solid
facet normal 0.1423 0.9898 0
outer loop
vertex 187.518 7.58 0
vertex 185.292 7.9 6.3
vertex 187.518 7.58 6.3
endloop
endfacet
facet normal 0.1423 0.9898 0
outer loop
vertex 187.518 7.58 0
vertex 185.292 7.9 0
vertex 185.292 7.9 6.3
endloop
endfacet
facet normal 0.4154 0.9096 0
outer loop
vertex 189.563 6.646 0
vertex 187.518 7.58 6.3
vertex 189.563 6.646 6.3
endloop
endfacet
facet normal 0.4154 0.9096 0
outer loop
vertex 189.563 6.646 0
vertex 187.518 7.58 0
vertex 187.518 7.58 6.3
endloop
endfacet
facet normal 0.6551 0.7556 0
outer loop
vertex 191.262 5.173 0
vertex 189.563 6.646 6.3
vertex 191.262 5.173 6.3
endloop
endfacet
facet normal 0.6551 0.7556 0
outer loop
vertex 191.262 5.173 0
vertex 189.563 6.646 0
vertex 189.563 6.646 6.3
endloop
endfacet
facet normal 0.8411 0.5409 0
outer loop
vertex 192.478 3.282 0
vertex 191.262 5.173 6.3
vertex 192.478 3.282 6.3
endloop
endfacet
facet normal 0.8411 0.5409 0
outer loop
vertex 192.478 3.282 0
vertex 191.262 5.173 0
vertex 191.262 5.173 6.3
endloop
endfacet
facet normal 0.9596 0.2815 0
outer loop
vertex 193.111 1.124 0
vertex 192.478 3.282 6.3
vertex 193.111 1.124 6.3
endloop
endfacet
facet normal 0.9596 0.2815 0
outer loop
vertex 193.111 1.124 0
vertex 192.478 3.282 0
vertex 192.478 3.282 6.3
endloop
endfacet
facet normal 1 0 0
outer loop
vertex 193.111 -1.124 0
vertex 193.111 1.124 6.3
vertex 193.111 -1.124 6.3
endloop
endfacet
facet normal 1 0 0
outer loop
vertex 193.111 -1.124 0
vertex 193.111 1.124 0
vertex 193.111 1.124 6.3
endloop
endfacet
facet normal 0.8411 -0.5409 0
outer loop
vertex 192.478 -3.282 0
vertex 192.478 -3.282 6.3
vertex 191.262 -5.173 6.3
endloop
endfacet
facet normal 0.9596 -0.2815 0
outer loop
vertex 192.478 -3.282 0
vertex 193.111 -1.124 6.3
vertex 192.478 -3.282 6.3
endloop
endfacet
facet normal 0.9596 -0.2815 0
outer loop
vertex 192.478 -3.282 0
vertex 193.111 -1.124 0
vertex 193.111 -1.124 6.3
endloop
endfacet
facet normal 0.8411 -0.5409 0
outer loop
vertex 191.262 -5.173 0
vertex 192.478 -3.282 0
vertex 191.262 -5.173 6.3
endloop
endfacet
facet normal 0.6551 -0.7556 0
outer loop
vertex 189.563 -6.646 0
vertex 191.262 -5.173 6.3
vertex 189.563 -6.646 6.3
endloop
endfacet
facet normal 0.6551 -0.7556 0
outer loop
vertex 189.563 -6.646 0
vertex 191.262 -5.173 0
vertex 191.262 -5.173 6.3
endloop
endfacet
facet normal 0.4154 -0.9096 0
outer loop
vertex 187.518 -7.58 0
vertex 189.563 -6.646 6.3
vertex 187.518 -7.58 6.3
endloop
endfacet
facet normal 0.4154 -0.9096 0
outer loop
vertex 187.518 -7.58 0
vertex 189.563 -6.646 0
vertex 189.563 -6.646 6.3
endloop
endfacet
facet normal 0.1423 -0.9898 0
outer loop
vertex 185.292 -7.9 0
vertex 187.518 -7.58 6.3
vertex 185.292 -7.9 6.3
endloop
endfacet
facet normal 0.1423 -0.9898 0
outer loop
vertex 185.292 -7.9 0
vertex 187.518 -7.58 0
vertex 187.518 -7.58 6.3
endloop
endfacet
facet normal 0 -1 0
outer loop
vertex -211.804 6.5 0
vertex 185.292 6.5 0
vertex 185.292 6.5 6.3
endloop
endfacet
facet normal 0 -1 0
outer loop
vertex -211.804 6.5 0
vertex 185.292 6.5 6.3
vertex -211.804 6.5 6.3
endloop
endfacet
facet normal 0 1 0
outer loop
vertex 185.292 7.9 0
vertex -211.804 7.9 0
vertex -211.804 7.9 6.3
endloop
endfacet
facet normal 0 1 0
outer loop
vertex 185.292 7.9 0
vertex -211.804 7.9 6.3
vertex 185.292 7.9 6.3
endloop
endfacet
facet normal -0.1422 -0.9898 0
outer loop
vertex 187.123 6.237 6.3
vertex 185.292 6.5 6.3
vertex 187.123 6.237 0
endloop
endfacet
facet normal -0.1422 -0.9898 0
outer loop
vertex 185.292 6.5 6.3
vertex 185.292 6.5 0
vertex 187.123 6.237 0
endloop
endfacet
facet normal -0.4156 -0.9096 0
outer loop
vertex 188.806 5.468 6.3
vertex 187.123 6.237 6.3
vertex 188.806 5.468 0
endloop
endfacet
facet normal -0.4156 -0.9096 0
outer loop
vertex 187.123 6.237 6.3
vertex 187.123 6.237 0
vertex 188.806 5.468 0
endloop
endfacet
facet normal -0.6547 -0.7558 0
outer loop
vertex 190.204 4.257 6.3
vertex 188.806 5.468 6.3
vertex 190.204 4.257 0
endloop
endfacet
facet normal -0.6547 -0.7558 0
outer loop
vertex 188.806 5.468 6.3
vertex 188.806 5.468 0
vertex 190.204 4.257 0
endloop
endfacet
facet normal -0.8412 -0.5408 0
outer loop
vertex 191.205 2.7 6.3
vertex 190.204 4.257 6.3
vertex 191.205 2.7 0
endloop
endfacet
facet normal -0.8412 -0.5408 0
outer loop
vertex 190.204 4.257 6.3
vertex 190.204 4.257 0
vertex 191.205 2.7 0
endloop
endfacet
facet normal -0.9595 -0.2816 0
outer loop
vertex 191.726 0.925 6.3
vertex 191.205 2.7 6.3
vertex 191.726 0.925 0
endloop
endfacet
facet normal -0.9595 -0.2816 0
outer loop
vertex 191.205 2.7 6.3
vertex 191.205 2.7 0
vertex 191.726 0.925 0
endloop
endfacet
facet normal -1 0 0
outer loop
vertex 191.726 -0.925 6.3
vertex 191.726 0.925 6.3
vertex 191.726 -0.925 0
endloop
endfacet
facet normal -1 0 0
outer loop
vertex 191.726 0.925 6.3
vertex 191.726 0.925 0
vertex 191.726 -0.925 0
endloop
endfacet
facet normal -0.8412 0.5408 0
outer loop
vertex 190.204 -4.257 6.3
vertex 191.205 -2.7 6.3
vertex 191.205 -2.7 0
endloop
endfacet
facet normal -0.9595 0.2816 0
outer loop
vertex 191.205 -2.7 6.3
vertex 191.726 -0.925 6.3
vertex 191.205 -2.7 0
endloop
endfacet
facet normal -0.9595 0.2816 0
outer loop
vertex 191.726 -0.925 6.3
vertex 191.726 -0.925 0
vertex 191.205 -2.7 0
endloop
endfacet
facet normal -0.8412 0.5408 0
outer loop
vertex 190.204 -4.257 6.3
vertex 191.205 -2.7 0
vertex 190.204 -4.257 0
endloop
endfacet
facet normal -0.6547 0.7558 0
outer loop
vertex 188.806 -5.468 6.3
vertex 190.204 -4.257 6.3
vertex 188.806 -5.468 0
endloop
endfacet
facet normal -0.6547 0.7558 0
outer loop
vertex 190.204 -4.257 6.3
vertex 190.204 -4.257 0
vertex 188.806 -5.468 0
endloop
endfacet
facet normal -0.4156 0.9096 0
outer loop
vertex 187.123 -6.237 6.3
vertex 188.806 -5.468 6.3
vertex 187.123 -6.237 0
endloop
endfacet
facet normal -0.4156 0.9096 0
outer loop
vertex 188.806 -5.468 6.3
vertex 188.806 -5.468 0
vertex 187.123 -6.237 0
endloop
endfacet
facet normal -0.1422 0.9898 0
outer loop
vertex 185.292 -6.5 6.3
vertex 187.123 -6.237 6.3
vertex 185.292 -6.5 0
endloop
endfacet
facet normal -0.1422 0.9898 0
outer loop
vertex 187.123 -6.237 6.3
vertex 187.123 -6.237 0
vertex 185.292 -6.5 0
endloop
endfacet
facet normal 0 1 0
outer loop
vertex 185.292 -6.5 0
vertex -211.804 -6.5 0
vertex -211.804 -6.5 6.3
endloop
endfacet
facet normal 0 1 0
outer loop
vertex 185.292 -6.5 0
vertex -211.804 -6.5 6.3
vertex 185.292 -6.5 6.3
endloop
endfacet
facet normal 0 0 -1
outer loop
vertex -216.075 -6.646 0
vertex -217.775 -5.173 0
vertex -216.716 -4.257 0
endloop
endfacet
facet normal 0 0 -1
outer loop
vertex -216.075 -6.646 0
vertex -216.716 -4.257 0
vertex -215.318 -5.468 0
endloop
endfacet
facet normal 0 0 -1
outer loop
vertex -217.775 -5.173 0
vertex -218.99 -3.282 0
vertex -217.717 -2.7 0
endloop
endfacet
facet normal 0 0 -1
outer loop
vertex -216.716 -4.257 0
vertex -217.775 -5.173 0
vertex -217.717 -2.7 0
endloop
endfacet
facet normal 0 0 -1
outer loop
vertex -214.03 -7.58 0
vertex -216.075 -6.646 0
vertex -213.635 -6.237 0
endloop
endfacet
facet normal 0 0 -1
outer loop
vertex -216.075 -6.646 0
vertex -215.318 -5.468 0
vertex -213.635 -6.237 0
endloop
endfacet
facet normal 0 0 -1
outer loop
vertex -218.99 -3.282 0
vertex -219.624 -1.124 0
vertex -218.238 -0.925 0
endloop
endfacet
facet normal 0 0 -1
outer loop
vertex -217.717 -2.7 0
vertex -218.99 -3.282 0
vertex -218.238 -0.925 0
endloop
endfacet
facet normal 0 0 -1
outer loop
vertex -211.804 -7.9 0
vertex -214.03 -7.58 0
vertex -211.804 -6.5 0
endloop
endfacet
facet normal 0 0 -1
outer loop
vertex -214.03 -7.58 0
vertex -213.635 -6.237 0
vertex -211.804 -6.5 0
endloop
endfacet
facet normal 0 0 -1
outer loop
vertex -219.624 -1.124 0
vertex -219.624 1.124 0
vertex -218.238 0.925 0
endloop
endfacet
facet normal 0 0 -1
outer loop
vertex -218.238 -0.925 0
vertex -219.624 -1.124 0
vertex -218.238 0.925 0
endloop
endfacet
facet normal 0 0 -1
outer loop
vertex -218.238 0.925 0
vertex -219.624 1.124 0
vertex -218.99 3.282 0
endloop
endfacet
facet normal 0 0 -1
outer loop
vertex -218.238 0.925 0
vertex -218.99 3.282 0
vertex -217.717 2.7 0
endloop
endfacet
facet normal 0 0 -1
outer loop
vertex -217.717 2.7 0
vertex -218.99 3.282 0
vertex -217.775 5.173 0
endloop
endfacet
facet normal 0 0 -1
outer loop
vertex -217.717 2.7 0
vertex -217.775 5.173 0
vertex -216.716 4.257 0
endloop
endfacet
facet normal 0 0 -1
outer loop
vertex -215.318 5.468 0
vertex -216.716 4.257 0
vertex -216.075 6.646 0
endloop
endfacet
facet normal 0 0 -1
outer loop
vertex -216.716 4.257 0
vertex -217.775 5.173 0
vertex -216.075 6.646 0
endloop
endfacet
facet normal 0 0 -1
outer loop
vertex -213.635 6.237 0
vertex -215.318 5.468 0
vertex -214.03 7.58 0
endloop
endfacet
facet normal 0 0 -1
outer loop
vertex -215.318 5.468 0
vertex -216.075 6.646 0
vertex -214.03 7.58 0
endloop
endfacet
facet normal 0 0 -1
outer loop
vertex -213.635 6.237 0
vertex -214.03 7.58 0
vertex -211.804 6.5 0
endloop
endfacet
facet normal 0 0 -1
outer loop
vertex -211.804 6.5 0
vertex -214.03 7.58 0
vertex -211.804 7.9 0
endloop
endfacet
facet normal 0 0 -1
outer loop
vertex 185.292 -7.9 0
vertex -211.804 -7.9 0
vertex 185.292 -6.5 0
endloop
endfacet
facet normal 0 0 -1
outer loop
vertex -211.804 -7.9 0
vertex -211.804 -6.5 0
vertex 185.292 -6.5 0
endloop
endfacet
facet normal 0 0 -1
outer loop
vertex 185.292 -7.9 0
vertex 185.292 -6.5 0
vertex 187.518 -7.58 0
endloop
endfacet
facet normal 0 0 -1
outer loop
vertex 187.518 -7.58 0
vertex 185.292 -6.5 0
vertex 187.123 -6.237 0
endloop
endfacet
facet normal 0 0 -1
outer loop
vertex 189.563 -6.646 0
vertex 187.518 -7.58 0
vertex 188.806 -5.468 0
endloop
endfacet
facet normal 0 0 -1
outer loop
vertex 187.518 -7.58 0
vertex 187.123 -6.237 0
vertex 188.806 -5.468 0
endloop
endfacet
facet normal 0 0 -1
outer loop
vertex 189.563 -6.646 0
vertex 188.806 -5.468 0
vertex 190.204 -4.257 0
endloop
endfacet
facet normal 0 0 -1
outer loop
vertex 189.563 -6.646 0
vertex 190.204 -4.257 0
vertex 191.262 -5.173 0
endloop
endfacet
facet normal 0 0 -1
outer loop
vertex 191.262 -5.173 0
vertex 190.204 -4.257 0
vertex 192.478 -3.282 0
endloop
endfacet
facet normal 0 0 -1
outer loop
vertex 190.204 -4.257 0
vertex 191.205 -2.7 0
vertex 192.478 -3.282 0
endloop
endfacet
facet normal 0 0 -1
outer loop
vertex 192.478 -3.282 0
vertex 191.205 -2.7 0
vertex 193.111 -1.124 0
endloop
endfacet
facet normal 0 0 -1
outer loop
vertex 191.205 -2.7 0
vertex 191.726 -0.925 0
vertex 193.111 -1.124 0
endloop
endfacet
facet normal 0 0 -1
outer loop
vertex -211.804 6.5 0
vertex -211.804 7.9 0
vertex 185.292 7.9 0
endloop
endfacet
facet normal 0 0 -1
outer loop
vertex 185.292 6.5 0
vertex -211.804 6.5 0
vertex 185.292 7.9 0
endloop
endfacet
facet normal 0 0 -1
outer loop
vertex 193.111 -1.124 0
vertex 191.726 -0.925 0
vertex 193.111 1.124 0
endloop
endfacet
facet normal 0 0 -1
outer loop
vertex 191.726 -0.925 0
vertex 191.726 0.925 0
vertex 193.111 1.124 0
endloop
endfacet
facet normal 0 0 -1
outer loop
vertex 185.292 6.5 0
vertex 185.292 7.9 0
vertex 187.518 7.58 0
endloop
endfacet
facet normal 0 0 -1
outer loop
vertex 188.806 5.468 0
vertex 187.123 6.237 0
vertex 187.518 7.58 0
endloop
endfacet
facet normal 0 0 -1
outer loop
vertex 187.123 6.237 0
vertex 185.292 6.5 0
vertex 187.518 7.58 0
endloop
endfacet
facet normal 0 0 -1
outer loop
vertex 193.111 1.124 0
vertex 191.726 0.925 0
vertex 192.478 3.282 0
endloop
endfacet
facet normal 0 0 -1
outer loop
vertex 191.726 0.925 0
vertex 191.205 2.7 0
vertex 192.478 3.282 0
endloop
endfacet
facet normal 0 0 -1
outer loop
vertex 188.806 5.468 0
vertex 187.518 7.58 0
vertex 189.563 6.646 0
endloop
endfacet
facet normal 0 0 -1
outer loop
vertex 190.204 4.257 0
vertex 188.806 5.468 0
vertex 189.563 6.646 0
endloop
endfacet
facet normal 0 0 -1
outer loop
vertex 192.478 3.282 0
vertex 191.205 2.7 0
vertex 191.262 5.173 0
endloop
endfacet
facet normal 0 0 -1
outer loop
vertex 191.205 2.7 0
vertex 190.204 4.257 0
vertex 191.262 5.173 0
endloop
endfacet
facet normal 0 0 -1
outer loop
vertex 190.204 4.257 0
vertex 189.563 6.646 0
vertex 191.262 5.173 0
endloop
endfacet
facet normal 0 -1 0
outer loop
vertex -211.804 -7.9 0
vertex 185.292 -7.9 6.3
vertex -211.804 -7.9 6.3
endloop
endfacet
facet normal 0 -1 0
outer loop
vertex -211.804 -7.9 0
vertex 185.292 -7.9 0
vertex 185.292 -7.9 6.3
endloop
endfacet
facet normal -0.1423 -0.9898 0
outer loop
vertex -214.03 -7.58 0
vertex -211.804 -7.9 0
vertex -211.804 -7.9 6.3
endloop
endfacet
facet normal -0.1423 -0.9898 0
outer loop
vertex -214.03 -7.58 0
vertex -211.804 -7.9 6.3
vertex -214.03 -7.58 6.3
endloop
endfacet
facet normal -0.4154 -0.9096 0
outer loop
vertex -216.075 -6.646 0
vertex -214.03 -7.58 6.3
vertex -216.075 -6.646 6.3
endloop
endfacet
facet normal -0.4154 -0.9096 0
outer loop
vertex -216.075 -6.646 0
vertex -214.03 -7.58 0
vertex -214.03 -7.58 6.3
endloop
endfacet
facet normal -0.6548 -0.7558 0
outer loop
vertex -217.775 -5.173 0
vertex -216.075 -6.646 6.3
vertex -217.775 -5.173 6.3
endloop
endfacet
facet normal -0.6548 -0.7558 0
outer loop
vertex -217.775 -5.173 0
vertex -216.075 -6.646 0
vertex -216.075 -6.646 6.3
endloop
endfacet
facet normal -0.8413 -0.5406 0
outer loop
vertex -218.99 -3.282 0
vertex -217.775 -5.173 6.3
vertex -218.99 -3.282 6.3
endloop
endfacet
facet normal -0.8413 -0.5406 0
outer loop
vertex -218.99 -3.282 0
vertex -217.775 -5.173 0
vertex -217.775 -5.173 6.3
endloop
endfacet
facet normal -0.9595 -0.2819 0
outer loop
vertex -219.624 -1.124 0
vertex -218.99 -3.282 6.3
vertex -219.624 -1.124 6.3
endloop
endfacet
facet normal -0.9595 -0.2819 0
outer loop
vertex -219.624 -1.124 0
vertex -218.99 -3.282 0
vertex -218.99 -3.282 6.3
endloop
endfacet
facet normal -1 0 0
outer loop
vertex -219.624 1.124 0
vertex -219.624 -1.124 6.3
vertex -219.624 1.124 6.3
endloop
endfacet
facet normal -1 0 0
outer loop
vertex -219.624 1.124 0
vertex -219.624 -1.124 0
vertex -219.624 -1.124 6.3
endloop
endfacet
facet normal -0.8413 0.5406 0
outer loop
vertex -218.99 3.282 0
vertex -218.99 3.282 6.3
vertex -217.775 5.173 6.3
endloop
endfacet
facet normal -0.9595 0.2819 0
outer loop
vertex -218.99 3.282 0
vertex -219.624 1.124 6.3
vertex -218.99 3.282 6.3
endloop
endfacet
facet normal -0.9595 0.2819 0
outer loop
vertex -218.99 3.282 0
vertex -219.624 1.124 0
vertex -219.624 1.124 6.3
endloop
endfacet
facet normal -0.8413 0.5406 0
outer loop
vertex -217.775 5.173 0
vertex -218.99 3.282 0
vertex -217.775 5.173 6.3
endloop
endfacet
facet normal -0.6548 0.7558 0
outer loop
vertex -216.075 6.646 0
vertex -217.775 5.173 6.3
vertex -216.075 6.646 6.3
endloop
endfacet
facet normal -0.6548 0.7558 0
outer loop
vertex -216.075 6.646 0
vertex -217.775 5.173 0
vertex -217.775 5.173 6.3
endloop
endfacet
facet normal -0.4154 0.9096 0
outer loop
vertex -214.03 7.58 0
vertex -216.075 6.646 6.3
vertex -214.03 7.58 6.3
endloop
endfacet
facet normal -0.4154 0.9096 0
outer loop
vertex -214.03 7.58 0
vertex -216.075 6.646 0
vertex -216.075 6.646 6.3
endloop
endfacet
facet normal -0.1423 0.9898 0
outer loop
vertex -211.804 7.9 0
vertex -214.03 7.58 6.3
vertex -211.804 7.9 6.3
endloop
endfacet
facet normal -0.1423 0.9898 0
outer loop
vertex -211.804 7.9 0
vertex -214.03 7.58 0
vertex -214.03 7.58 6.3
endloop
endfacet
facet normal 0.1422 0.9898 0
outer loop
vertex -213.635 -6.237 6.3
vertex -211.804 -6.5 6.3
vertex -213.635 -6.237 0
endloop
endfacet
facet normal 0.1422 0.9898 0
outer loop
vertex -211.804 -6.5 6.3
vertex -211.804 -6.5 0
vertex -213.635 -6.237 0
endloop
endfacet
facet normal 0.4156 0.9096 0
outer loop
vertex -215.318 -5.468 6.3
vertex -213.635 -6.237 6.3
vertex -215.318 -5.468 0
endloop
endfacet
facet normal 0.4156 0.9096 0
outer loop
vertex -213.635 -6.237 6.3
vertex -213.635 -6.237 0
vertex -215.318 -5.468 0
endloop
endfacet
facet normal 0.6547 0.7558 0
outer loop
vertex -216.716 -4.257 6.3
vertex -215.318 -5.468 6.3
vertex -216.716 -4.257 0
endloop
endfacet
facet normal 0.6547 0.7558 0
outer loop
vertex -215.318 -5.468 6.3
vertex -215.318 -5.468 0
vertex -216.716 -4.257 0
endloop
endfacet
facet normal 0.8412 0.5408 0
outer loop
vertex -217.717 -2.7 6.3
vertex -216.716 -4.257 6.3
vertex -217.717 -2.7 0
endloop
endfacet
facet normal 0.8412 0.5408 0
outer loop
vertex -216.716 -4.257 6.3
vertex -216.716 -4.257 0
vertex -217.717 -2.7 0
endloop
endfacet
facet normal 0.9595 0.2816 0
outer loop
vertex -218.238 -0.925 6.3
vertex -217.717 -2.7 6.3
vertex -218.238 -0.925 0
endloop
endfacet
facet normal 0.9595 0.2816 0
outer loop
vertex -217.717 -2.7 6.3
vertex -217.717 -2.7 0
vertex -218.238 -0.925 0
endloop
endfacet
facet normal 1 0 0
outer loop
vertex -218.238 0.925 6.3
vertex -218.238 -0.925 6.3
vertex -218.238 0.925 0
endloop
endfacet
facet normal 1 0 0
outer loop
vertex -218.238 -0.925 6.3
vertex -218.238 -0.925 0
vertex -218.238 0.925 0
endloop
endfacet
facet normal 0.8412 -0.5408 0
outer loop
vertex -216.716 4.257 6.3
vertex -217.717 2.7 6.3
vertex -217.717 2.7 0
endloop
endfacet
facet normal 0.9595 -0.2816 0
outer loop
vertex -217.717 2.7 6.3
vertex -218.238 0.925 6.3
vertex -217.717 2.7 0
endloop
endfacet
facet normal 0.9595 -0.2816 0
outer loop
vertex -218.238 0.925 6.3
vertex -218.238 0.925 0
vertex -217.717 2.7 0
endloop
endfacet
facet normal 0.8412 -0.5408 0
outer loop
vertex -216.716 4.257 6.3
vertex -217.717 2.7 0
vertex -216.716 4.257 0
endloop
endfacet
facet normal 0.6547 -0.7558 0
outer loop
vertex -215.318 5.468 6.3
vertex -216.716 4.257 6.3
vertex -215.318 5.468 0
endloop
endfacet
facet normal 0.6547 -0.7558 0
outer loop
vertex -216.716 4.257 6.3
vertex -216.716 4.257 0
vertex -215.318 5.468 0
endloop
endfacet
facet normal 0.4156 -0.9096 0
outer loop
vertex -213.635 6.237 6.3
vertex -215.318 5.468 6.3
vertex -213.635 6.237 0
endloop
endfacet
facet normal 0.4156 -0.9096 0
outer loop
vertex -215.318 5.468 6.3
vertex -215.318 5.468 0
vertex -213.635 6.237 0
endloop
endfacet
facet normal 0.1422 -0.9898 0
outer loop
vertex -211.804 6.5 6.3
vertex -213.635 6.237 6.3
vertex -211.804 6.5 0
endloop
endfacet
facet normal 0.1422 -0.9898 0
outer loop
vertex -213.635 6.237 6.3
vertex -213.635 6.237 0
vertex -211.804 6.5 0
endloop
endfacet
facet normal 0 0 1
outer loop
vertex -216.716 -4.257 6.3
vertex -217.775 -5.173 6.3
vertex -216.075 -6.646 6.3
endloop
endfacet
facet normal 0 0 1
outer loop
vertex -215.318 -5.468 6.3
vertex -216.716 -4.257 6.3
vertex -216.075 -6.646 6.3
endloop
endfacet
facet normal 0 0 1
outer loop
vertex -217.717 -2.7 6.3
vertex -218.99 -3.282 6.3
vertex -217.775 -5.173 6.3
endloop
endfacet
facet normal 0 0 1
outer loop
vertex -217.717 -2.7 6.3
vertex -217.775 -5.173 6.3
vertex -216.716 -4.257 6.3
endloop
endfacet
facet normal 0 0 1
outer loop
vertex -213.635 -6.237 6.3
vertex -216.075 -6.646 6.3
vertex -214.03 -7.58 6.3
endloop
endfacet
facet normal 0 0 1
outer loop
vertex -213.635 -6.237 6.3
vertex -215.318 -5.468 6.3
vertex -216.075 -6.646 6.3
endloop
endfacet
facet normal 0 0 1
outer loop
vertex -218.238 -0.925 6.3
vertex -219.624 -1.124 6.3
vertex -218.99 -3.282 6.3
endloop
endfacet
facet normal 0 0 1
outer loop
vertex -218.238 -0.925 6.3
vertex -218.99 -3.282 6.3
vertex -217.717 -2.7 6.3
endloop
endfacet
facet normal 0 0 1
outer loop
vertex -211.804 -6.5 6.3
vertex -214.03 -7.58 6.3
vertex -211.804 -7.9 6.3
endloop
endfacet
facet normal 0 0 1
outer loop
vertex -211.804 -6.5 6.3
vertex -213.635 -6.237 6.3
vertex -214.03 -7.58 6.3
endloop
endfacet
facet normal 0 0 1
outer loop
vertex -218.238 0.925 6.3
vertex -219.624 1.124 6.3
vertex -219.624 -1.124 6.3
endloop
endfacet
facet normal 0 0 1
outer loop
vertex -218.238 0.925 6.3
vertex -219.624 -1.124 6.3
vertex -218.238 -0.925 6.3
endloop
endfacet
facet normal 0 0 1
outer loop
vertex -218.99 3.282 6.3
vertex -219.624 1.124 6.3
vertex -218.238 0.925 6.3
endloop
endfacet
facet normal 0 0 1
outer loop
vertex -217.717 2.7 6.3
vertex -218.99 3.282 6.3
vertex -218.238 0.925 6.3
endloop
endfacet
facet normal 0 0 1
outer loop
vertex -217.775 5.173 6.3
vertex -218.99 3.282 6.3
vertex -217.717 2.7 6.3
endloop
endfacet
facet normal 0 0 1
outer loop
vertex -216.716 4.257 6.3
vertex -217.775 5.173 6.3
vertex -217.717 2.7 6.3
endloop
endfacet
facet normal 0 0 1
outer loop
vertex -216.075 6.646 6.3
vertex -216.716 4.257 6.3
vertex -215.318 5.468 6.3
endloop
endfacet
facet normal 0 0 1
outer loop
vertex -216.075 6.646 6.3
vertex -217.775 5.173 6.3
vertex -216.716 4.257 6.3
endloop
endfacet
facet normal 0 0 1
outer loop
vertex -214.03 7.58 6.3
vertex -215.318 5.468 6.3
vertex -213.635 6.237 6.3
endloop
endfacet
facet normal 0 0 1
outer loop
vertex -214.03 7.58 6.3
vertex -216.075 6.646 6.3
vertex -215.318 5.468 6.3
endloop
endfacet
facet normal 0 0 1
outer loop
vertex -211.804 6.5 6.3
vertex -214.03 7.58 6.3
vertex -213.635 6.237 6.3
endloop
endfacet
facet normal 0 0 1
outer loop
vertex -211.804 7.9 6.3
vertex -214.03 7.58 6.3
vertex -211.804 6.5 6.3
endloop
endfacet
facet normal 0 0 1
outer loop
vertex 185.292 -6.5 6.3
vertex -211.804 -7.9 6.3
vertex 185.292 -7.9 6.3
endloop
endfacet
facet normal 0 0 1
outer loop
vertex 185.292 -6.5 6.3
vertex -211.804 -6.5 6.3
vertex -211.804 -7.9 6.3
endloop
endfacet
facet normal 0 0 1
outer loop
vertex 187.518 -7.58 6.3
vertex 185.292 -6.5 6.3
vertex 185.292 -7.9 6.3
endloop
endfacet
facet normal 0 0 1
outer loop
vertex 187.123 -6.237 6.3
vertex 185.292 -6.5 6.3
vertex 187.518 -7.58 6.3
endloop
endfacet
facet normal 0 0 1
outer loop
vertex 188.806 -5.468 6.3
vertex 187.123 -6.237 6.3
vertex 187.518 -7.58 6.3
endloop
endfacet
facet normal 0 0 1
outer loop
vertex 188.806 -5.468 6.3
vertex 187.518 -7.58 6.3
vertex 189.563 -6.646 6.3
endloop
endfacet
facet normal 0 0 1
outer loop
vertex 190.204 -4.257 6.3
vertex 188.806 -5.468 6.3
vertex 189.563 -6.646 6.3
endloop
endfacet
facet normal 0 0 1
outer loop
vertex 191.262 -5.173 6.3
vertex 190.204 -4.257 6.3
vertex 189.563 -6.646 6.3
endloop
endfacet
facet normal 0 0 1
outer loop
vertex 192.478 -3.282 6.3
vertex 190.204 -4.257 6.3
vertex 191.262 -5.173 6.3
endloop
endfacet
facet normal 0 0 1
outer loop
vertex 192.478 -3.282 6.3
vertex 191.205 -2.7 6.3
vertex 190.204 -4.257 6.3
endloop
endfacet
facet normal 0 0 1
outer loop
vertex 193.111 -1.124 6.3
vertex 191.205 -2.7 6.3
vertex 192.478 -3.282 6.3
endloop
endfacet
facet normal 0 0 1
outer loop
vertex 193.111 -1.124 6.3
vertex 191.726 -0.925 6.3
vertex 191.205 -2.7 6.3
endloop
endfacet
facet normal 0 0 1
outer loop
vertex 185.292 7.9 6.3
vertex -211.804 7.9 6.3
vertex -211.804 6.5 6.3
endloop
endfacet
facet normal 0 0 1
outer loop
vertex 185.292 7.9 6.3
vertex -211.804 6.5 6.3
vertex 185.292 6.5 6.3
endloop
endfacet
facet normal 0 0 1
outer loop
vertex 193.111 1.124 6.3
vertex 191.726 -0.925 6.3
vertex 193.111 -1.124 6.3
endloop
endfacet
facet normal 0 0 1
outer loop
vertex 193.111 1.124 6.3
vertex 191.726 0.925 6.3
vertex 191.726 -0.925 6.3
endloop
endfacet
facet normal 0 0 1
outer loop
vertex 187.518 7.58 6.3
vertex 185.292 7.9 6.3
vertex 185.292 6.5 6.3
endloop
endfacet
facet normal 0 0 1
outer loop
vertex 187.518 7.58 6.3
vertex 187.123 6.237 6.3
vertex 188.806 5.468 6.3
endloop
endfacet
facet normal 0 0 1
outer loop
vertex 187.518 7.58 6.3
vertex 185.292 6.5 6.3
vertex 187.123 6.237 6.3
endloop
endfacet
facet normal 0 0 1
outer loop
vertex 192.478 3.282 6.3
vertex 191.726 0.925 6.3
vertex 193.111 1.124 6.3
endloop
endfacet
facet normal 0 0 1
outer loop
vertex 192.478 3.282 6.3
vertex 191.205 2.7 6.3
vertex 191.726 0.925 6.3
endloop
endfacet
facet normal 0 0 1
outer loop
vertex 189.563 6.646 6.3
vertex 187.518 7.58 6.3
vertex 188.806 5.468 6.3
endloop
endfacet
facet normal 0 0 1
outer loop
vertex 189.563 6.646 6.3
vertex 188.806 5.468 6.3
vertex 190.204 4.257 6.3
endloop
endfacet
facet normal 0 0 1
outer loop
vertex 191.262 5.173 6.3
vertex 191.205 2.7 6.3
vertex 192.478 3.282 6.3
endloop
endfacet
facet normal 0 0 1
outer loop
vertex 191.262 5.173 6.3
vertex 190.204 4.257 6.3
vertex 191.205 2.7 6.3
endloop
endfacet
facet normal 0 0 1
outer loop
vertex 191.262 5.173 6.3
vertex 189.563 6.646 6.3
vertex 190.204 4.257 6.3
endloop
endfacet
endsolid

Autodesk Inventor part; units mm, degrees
ref_plane "YZ Plane" through (0, 0, 0) normal (1, 0, 0) x (0, 1, 0)
ref_plane "XZ Plane" through (0, 0, 0) normal (0, 1, 0) x (-1, 0, 0)
ref_plane "XY Plane" through (0, 0, 0) normal (0, 0, 1) x (1, 0, 0)
sketch "Szkic1" plane through (0, 0, 0) normal (0, 0, 1) x (1, 0, 0)
  line L0 (-211.8041, 0) -> (185.2919, 0) construction
  line L1 (-211.8041, -6.5) -> (185.2919, -6.5)
  line L2 (185.2919, 6.5) -> (-211.8041, 6.5)
  arc A0 (-211.8041, 6.5) -> (-211.8041, -6.5) centre (-211.8041, 0) ccw
  arc A1 (185.2919, -6.5) -> (185.2919, 6.5) centre (185.2919, 0) ccw
  line L3 (-211.8041, 7.9) -> (185.2919, 7.9)
  arc A2 (185.2919, -7.9) -> (185.2919, 7.9) centre (185.2919, 0) ccw
  line L4 (185.2919, -7.9) -> (-211.8041, -7.9)
  arc A3 (-211.8041, 7.9) -> (-211.8041, -7.9) centre (-211.8041, 0) ccw
  point P0 (0, 0)
  point P1 (-13.2561, 0)
  dimension "d0" = 198.548
  dimension "d1" = 13
  dimension "d2" = 1.4
extrude "Wyciągnięcie proste1" add sketch "Szkic1" along normal blind 6.3
properties part number "COTS_GENERIC_X_Axis_Timing_Belt"
